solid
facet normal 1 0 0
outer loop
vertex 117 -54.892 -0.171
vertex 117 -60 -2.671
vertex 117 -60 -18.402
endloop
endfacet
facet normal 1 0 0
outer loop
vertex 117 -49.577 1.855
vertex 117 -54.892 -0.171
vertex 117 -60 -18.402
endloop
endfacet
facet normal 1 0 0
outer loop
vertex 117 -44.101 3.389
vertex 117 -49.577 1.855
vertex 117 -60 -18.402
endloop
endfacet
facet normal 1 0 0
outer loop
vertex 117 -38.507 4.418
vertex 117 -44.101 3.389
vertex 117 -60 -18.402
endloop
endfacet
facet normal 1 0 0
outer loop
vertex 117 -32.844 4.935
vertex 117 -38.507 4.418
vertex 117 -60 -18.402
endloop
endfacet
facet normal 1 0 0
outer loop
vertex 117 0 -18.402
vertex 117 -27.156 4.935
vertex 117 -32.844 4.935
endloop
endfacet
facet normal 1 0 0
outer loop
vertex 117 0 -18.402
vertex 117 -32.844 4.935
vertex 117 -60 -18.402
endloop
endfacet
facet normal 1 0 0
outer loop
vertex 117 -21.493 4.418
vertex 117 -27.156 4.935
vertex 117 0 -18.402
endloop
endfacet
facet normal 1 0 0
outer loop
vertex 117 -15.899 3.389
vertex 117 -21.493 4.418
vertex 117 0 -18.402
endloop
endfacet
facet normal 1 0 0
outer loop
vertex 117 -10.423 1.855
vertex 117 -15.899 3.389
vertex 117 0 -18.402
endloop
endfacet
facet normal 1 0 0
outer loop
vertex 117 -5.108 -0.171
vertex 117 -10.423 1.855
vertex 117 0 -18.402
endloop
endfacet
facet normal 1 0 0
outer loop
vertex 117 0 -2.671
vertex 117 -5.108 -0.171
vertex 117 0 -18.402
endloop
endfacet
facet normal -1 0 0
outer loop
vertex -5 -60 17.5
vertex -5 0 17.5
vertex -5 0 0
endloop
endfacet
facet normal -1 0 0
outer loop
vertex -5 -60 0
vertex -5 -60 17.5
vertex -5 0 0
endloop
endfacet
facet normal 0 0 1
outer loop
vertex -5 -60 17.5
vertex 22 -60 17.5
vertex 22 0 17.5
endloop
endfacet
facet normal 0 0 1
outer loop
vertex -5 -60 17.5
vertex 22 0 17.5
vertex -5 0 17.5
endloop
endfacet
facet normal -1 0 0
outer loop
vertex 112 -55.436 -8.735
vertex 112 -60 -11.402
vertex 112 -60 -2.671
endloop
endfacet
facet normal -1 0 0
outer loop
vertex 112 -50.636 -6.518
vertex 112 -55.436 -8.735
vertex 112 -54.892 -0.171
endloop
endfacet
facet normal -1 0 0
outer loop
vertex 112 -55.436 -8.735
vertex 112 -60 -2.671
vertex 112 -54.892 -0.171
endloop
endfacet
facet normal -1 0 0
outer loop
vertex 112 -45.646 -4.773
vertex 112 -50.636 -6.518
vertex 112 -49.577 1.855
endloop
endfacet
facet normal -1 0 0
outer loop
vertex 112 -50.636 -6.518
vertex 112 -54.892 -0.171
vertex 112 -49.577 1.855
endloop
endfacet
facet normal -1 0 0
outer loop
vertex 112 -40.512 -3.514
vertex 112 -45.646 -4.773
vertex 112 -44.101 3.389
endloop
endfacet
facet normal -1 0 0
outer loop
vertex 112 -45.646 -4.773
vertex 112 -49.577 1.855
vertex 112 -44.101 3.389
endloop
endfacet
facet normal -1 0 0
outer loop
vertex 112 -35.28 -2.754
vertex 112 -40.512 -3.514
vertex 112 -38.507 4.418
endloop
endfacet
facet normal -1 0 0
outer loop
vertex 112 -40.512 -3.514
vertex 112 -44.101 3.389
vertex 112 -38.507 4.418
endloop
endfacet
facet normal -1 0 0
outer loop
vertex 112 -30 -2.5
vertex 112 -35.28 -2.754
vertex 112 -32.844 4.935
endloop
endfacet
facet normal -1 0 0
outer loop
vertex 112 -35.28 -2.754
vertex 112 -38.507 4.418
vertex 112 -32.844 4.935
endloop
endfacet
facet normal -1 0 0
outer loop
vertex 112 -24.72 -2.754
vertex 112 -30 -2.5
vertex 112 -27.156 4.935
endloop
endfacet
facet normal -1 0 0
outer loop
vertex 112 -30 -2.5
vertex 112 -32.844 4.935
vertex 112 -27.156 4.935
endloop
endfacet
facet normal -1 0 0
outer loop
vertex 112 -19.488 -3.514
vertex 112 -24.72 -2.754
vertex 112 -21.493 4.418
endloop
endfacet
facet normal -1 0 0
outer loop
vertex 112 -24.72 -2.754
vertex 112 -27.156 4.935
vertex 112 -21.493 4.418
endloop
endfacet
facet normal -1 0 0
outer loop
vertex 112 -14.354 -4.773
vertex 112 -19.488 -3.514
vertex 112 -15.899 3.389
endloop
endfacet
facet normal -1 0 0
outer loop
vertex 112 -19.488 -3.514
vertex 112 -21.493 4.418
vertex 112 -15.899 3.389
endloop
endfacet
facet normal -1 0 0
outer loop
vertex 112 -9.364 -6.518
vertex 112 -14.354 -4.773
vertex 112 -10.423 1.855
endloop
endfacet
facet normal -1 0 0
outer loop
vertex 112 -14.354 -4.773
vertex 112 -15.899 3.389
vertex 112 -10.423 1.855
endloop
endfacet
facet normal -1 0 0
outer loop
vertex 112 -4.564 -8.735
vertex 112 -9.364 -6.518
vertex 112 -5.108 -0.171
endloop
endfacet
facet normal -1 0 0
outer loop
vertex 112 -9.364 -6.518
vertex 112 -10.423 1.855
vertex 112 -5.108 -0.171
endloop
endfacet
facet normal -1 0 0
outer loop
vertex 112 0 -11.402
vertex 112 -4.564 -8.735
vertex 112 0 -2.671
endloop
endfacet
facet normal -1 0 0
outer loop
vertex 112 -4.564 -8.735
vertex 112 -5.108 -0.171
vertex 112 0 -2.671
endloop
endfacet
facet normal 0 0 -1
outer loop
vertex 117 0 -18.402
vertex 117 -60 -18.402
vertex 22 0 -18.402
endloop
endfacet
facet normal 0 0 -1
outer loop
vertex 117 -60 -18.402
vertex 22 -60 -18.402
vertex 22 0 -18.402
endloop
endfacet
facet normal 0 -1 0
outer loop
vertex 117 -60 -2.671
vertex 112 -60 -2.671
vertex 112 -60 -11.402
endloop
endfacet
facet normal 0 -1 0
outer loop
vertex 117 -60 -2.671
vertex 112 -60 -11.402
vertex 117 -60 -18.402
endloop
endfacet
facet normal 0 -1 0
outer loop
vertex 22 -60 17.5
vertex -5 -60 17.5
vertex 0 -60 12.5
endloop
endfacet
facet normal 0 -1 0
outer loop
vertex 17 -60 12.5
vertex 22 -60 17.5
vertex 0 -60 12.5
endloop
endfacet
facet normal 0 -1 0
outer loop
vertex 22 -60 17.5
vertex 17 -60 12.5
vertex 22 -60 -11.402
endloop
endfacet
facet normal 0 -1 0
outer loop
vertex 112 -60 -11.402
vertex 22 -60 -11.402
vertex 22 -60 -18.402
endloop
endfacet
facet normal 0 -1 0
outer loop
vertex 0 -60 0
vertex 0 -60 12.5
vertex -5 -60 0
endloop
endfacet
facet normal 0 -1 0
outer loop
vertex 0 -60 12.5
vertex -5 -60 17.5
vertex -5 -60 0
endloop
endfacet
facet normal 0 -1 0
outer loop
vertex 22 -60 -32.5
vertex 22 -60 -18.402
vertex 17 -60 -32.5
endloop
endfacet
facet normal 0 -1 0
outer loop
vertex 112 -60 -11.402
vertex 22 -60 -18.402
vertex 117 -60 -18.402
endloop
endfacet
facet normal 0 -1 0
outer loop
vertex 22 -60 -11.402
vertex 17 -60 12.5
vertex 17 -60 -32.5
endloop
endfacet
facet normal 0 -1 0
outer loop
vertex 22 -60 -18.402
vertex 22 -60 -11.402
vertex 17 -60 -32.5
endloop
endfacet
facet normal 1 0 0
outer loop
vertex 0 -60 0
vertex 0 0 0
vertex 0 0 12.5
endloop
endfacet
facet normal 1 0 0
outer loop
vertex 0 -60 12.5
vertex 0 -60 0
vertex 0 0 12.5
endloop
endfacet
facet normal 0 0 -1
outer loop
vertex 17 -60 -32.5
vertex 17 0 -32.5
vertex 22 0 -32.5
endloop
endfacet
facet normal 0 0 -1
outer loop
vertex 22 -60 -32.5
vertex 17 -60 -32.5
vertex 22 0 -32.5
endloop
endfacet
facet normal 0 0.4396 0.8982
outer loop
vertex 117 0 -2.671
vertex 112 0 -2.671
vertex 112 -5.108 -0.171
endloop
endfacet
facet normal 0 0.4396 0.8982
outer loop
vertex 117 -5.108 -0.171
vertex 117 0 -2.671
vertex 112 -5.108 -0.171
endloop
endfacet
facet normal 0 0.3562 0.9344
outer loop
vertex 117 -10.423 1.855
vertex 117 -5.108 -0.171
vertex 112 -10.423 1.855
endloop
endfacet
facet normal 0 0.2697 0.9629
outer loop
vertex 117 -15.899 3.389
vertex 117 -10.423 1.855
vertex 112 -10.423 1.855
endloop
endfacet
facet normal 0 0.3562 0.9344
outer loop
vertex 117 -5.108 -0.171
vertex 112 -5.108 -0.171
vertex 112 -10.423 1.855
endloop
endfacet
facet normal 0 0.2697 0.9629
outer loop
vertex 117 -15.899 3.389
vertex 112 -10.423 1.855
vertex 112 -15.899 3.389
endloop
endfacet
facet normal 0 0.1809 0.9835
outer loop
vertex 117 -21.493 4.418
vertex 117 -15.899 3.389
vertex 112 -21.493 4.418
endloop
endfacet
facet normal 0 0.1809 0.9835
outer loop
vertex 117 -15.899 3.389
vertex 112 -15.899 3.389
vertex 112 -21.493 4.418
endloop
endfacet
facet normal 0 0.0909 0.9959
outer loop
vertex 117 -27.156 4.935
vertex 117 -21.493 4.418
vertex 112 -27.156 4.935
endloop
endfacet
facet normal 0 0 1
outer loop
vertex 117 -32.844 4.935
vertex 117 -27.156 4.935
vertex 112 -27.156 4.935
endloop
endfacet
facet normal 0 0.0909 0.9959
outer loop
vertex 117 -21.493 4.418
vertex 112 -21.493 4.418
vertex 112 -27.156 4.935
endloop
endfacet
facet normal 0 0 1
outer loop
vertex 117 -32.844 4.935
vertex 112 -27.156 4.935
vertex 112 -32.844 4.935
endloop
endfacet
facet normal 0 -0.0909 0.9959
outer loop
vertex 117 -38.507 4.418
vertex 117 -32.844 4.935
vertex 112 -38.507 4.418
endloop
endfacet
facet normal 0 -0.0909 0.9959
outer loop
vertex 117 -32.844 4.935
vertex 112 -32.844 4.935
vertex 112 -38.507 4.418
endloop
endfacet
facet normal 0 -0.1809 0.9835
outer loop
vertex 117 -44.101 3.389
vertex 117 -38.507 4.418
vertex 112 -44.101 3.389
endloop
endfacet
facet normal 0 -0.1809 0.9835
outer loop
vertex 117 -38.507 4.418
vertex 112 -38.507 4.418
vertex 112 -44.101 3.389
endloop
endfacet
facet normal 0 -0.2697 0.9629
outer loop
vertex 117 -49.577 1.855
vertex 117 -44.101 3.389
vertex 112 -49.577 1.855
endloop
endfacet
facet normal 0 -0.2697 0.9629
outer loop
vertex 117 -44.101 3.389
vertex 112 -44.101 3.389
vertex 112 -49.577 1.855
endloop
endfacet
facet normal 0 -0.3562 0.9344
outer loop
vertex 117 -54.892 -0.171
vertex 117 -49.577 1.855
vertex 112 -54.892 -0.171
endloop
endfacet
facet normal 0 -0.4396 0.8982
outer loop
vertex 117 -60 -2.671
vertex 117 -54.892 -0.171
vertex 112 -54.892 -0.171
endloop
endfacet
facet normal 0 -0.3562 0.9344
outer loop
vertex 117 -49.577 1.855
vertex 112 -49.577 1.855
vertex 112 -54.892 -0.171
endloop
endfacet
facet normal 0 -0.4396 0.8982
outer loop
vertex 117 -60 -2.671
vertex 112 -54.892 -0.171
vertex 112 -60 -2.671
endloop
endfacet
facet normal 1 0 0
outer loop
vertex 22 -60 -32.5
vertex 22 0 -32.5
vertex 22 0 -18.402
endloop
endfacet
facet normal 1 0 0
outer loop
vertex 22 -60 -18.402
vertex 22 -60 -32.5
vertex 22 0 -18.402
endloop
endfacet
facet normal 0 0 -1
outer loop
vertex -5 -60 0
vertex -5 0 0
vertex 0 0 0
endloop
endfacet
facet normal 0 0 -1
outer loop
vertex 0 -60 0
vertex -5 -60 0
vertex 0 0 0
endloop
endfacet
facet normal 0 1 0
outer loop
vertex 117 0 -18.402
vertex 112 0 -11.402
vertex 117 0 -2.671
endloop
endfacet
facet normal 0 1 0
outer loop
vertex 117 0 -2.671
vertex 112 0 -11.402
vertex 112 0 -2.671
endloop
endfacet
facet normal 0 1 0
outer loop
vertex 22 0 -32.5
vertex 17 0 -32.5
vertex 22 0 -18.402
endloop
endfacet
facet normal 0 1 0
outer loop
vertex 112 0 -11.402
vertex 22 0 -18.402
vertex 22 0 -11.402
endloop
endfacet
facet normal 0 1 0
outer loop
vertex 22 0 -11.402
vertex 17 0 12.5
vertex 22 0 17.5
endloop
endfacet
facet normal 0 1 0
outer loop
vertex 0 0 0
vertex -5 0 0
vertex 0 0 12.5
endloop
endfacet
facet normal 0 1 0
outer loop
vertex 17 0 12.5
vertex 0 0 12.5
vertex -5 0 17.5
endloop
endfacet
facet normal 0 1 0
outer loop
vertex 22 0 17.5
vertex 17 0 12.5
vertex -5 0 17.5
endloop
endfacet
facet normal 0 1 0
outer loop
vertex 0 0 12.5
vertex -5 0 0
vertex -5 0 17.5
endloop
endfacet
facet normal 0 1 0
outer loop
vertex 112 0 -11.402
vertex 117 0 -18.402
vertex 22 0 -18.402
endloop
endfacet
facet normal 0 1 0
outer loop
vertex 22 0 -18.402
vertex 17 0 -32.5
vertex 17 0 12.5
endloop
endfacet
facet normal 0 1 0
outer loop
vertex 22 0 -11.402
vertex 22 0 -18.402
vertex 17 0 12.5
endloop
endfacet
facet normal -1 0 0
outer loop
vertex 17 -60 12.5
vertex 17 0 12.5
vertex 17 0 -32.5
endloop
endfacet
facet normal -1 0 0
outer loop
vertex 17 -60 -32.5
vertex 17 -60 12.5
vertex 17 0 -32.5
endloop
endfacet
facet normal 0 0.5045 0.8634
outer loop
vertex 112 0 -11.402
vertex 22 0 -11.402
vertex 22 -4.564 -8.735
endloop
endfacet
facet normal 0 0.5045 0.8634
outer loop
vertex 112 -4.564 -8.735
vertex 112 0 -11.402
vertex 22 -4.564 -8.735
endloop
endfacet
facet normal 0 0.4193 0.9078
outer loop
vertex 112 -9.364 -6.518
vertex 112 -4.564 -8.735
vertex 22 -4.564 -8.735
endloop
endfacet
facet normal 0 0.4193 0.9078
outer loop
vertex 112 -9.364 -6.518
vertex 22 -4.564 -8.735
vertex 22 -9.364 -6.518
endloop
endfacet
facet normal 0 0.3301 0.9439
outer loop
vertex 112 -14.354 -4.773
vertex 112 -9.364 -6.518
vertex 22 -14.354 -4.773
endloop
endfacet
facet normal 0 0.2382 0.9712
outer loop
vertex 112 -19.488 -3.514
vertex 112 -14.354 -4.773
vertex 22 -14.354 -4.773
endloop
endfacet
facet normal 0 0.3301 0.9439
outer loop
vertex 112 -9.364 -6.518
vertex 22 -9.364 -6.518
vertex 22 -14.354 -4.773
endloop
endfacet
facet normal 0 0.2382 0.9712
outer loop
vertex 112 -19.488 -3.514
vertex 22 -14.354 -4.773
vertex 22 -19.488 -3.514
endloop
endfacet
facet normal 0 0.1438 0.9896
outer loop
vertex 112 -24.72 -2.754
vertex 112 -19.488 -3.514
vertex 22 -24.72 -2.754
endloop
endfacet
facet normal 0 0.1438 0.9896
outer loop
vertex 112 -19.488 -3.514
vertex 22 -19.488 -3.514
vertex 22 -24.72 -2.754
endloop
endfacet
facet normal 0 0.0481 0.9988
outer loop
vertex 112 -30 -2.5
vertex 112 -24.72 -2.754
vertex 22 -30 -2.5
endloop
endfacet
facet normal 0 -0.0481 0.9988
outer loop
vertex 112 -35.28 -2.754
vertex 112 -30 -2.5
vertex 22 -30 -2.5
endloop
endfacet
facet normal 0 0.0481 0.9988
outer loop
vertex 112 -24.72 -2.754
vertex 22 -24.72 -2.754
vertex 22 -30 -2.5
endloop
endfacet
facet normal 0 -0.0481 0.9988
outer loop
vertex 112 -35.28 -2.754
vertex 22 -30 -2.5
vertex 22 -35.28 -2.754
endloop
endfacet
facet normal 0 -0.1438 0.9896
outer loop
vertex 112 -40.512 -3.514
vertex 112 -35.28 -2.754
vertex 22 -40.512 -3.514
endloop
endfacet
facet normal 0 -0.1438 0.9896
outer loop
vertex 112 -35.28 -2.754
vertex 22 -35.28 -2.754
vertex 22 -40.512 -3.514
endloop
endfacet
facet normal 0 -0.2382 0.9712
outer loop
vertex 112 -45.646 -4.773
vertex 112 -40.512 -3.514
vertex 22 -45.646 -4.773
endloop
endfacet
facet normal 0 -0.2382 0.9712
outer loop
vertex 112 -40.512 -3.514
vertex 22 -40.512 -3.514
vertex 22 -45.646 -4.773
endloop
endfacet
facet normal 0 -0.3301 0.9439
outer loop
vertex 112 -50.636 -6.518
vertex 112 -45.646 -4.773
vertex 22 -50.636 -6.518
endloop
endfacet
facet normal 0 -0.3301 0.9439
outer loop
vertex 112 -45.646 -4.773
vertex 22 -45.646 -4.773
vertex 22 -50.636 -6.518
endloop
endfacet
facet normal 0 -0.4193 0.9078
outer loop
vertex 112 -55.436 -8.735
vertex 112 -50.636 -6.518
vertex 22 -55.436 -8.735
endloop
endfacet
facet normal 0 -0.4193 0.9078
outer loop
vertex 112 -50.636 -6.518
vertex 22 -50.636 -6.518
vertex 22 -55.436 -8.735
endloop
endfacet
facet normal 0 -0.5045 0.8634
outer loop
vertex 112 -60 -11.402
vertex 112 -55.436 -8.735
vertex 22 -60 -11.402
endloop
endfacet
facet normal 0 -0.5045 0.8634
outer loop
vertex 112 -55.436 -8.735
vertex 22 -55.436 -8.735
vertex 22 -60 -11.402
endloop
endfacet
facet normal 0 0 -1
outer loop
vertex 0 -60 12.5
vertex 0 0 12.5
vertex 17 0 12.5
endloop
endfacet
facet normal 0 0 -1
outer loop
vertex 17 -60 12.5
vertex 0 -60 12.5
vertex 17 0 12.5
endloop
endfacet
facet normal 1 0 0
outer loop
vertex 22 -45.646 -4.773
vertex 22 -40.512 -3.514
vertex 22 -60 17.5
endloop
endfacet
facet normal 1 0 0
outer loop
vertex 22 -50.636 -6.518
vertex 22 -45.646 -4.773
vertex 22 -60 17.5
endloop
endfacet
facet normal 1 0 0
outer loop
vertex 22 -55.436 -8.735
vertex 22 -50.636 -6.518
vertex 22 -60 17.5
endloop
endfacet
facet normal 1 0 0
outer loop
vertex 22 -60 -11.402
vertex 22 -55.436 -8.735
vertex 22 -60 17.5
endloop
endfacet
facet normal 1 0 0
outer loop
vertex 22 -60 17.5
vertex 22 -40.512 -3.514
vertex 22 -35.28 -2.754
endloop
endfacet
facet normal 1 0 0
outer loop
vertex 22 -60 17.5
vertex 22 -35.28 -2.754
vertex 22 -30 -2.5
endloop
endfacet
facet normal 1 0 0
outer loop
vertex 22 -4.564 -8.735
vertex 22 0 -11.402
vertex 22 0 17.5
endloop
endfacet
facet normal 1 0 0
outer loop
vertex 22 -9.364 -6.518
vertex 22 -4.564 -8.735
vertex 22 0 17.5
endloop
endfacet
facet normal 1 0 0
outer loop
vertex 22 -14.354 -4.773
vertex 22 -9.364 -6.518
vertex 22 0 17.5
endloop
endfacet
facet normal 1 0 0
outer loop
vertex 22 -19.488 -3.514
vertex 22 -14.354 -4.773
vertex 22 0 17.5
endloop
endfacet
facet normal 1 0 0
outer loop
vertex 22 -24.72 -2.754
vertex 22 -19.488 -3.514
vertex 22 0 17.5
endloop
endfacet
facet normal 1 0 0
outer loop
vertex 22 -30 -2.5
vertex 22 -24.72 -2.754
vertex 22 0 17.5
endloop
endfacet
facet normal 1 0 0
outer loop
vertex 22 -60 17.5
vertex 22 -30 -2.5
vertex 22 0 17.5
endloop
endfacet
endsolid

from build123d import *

# Parameters (mm, degrees)
F1_DEPTH = 60
F3_DEPTH = 90
F5_DEPTH = 5


with BuildPart() as f1:
    # F0 (on Front) → F1 (new body)
    with BuildSketch(Plane.XZ):
        Polygon((-5, 0), (0, 0), (0, 12.5), (17, 12.5), (17, -32.5), (22, -32.5), (22, 17.5), (-5, 17.5), align=None)
    extrude(amount=F1_DEPTH)

    # F2 (on face) → F3 (join)
    with BuildSketch(Plane.YZ.offset(22)):
        with BuildLine():
            Line((-60, -18.402278), (0, -18.402278))
            Line((0, -18.402278), (0, -11.402278))
            ThreePointArc((0, -11.402278), (-30, -2.5), (-60, -11.402278))
            Line((-60, -11.402278), (-60, -18.402278))
        make_face()
    extrude(amount=F3_DEPTH)

    # F4 (on face) → F5 (join)
    with BuildSketch(Plane.YZ.offset(112)):
        with BuildLine():
            ThreePointArc((-60, -11.402278), (-30, -2.5), (0, -11.402278))
            Line((0, -11.402278), (0, -2.67072))
            ThreePointArc((0, -2.67072), (-30, 5), (-60, -2.67072))
            Line((-60, -2.67072), (-60, -11.402278))
        make_face()
        with BuildLine():
            Line((-60, -18.402278), (0, -18.402278))
            Line((0, -18.402278), (0, -11.402278))
            ThreePointArc((0, -11.402278), (-30, -2.5), (-60, -11.402278))
            Line((-60, -11.402278), (-60, -18.402278))
        make_face()
    extrude(amount=F5_DEPTH)


solid = f1.part
